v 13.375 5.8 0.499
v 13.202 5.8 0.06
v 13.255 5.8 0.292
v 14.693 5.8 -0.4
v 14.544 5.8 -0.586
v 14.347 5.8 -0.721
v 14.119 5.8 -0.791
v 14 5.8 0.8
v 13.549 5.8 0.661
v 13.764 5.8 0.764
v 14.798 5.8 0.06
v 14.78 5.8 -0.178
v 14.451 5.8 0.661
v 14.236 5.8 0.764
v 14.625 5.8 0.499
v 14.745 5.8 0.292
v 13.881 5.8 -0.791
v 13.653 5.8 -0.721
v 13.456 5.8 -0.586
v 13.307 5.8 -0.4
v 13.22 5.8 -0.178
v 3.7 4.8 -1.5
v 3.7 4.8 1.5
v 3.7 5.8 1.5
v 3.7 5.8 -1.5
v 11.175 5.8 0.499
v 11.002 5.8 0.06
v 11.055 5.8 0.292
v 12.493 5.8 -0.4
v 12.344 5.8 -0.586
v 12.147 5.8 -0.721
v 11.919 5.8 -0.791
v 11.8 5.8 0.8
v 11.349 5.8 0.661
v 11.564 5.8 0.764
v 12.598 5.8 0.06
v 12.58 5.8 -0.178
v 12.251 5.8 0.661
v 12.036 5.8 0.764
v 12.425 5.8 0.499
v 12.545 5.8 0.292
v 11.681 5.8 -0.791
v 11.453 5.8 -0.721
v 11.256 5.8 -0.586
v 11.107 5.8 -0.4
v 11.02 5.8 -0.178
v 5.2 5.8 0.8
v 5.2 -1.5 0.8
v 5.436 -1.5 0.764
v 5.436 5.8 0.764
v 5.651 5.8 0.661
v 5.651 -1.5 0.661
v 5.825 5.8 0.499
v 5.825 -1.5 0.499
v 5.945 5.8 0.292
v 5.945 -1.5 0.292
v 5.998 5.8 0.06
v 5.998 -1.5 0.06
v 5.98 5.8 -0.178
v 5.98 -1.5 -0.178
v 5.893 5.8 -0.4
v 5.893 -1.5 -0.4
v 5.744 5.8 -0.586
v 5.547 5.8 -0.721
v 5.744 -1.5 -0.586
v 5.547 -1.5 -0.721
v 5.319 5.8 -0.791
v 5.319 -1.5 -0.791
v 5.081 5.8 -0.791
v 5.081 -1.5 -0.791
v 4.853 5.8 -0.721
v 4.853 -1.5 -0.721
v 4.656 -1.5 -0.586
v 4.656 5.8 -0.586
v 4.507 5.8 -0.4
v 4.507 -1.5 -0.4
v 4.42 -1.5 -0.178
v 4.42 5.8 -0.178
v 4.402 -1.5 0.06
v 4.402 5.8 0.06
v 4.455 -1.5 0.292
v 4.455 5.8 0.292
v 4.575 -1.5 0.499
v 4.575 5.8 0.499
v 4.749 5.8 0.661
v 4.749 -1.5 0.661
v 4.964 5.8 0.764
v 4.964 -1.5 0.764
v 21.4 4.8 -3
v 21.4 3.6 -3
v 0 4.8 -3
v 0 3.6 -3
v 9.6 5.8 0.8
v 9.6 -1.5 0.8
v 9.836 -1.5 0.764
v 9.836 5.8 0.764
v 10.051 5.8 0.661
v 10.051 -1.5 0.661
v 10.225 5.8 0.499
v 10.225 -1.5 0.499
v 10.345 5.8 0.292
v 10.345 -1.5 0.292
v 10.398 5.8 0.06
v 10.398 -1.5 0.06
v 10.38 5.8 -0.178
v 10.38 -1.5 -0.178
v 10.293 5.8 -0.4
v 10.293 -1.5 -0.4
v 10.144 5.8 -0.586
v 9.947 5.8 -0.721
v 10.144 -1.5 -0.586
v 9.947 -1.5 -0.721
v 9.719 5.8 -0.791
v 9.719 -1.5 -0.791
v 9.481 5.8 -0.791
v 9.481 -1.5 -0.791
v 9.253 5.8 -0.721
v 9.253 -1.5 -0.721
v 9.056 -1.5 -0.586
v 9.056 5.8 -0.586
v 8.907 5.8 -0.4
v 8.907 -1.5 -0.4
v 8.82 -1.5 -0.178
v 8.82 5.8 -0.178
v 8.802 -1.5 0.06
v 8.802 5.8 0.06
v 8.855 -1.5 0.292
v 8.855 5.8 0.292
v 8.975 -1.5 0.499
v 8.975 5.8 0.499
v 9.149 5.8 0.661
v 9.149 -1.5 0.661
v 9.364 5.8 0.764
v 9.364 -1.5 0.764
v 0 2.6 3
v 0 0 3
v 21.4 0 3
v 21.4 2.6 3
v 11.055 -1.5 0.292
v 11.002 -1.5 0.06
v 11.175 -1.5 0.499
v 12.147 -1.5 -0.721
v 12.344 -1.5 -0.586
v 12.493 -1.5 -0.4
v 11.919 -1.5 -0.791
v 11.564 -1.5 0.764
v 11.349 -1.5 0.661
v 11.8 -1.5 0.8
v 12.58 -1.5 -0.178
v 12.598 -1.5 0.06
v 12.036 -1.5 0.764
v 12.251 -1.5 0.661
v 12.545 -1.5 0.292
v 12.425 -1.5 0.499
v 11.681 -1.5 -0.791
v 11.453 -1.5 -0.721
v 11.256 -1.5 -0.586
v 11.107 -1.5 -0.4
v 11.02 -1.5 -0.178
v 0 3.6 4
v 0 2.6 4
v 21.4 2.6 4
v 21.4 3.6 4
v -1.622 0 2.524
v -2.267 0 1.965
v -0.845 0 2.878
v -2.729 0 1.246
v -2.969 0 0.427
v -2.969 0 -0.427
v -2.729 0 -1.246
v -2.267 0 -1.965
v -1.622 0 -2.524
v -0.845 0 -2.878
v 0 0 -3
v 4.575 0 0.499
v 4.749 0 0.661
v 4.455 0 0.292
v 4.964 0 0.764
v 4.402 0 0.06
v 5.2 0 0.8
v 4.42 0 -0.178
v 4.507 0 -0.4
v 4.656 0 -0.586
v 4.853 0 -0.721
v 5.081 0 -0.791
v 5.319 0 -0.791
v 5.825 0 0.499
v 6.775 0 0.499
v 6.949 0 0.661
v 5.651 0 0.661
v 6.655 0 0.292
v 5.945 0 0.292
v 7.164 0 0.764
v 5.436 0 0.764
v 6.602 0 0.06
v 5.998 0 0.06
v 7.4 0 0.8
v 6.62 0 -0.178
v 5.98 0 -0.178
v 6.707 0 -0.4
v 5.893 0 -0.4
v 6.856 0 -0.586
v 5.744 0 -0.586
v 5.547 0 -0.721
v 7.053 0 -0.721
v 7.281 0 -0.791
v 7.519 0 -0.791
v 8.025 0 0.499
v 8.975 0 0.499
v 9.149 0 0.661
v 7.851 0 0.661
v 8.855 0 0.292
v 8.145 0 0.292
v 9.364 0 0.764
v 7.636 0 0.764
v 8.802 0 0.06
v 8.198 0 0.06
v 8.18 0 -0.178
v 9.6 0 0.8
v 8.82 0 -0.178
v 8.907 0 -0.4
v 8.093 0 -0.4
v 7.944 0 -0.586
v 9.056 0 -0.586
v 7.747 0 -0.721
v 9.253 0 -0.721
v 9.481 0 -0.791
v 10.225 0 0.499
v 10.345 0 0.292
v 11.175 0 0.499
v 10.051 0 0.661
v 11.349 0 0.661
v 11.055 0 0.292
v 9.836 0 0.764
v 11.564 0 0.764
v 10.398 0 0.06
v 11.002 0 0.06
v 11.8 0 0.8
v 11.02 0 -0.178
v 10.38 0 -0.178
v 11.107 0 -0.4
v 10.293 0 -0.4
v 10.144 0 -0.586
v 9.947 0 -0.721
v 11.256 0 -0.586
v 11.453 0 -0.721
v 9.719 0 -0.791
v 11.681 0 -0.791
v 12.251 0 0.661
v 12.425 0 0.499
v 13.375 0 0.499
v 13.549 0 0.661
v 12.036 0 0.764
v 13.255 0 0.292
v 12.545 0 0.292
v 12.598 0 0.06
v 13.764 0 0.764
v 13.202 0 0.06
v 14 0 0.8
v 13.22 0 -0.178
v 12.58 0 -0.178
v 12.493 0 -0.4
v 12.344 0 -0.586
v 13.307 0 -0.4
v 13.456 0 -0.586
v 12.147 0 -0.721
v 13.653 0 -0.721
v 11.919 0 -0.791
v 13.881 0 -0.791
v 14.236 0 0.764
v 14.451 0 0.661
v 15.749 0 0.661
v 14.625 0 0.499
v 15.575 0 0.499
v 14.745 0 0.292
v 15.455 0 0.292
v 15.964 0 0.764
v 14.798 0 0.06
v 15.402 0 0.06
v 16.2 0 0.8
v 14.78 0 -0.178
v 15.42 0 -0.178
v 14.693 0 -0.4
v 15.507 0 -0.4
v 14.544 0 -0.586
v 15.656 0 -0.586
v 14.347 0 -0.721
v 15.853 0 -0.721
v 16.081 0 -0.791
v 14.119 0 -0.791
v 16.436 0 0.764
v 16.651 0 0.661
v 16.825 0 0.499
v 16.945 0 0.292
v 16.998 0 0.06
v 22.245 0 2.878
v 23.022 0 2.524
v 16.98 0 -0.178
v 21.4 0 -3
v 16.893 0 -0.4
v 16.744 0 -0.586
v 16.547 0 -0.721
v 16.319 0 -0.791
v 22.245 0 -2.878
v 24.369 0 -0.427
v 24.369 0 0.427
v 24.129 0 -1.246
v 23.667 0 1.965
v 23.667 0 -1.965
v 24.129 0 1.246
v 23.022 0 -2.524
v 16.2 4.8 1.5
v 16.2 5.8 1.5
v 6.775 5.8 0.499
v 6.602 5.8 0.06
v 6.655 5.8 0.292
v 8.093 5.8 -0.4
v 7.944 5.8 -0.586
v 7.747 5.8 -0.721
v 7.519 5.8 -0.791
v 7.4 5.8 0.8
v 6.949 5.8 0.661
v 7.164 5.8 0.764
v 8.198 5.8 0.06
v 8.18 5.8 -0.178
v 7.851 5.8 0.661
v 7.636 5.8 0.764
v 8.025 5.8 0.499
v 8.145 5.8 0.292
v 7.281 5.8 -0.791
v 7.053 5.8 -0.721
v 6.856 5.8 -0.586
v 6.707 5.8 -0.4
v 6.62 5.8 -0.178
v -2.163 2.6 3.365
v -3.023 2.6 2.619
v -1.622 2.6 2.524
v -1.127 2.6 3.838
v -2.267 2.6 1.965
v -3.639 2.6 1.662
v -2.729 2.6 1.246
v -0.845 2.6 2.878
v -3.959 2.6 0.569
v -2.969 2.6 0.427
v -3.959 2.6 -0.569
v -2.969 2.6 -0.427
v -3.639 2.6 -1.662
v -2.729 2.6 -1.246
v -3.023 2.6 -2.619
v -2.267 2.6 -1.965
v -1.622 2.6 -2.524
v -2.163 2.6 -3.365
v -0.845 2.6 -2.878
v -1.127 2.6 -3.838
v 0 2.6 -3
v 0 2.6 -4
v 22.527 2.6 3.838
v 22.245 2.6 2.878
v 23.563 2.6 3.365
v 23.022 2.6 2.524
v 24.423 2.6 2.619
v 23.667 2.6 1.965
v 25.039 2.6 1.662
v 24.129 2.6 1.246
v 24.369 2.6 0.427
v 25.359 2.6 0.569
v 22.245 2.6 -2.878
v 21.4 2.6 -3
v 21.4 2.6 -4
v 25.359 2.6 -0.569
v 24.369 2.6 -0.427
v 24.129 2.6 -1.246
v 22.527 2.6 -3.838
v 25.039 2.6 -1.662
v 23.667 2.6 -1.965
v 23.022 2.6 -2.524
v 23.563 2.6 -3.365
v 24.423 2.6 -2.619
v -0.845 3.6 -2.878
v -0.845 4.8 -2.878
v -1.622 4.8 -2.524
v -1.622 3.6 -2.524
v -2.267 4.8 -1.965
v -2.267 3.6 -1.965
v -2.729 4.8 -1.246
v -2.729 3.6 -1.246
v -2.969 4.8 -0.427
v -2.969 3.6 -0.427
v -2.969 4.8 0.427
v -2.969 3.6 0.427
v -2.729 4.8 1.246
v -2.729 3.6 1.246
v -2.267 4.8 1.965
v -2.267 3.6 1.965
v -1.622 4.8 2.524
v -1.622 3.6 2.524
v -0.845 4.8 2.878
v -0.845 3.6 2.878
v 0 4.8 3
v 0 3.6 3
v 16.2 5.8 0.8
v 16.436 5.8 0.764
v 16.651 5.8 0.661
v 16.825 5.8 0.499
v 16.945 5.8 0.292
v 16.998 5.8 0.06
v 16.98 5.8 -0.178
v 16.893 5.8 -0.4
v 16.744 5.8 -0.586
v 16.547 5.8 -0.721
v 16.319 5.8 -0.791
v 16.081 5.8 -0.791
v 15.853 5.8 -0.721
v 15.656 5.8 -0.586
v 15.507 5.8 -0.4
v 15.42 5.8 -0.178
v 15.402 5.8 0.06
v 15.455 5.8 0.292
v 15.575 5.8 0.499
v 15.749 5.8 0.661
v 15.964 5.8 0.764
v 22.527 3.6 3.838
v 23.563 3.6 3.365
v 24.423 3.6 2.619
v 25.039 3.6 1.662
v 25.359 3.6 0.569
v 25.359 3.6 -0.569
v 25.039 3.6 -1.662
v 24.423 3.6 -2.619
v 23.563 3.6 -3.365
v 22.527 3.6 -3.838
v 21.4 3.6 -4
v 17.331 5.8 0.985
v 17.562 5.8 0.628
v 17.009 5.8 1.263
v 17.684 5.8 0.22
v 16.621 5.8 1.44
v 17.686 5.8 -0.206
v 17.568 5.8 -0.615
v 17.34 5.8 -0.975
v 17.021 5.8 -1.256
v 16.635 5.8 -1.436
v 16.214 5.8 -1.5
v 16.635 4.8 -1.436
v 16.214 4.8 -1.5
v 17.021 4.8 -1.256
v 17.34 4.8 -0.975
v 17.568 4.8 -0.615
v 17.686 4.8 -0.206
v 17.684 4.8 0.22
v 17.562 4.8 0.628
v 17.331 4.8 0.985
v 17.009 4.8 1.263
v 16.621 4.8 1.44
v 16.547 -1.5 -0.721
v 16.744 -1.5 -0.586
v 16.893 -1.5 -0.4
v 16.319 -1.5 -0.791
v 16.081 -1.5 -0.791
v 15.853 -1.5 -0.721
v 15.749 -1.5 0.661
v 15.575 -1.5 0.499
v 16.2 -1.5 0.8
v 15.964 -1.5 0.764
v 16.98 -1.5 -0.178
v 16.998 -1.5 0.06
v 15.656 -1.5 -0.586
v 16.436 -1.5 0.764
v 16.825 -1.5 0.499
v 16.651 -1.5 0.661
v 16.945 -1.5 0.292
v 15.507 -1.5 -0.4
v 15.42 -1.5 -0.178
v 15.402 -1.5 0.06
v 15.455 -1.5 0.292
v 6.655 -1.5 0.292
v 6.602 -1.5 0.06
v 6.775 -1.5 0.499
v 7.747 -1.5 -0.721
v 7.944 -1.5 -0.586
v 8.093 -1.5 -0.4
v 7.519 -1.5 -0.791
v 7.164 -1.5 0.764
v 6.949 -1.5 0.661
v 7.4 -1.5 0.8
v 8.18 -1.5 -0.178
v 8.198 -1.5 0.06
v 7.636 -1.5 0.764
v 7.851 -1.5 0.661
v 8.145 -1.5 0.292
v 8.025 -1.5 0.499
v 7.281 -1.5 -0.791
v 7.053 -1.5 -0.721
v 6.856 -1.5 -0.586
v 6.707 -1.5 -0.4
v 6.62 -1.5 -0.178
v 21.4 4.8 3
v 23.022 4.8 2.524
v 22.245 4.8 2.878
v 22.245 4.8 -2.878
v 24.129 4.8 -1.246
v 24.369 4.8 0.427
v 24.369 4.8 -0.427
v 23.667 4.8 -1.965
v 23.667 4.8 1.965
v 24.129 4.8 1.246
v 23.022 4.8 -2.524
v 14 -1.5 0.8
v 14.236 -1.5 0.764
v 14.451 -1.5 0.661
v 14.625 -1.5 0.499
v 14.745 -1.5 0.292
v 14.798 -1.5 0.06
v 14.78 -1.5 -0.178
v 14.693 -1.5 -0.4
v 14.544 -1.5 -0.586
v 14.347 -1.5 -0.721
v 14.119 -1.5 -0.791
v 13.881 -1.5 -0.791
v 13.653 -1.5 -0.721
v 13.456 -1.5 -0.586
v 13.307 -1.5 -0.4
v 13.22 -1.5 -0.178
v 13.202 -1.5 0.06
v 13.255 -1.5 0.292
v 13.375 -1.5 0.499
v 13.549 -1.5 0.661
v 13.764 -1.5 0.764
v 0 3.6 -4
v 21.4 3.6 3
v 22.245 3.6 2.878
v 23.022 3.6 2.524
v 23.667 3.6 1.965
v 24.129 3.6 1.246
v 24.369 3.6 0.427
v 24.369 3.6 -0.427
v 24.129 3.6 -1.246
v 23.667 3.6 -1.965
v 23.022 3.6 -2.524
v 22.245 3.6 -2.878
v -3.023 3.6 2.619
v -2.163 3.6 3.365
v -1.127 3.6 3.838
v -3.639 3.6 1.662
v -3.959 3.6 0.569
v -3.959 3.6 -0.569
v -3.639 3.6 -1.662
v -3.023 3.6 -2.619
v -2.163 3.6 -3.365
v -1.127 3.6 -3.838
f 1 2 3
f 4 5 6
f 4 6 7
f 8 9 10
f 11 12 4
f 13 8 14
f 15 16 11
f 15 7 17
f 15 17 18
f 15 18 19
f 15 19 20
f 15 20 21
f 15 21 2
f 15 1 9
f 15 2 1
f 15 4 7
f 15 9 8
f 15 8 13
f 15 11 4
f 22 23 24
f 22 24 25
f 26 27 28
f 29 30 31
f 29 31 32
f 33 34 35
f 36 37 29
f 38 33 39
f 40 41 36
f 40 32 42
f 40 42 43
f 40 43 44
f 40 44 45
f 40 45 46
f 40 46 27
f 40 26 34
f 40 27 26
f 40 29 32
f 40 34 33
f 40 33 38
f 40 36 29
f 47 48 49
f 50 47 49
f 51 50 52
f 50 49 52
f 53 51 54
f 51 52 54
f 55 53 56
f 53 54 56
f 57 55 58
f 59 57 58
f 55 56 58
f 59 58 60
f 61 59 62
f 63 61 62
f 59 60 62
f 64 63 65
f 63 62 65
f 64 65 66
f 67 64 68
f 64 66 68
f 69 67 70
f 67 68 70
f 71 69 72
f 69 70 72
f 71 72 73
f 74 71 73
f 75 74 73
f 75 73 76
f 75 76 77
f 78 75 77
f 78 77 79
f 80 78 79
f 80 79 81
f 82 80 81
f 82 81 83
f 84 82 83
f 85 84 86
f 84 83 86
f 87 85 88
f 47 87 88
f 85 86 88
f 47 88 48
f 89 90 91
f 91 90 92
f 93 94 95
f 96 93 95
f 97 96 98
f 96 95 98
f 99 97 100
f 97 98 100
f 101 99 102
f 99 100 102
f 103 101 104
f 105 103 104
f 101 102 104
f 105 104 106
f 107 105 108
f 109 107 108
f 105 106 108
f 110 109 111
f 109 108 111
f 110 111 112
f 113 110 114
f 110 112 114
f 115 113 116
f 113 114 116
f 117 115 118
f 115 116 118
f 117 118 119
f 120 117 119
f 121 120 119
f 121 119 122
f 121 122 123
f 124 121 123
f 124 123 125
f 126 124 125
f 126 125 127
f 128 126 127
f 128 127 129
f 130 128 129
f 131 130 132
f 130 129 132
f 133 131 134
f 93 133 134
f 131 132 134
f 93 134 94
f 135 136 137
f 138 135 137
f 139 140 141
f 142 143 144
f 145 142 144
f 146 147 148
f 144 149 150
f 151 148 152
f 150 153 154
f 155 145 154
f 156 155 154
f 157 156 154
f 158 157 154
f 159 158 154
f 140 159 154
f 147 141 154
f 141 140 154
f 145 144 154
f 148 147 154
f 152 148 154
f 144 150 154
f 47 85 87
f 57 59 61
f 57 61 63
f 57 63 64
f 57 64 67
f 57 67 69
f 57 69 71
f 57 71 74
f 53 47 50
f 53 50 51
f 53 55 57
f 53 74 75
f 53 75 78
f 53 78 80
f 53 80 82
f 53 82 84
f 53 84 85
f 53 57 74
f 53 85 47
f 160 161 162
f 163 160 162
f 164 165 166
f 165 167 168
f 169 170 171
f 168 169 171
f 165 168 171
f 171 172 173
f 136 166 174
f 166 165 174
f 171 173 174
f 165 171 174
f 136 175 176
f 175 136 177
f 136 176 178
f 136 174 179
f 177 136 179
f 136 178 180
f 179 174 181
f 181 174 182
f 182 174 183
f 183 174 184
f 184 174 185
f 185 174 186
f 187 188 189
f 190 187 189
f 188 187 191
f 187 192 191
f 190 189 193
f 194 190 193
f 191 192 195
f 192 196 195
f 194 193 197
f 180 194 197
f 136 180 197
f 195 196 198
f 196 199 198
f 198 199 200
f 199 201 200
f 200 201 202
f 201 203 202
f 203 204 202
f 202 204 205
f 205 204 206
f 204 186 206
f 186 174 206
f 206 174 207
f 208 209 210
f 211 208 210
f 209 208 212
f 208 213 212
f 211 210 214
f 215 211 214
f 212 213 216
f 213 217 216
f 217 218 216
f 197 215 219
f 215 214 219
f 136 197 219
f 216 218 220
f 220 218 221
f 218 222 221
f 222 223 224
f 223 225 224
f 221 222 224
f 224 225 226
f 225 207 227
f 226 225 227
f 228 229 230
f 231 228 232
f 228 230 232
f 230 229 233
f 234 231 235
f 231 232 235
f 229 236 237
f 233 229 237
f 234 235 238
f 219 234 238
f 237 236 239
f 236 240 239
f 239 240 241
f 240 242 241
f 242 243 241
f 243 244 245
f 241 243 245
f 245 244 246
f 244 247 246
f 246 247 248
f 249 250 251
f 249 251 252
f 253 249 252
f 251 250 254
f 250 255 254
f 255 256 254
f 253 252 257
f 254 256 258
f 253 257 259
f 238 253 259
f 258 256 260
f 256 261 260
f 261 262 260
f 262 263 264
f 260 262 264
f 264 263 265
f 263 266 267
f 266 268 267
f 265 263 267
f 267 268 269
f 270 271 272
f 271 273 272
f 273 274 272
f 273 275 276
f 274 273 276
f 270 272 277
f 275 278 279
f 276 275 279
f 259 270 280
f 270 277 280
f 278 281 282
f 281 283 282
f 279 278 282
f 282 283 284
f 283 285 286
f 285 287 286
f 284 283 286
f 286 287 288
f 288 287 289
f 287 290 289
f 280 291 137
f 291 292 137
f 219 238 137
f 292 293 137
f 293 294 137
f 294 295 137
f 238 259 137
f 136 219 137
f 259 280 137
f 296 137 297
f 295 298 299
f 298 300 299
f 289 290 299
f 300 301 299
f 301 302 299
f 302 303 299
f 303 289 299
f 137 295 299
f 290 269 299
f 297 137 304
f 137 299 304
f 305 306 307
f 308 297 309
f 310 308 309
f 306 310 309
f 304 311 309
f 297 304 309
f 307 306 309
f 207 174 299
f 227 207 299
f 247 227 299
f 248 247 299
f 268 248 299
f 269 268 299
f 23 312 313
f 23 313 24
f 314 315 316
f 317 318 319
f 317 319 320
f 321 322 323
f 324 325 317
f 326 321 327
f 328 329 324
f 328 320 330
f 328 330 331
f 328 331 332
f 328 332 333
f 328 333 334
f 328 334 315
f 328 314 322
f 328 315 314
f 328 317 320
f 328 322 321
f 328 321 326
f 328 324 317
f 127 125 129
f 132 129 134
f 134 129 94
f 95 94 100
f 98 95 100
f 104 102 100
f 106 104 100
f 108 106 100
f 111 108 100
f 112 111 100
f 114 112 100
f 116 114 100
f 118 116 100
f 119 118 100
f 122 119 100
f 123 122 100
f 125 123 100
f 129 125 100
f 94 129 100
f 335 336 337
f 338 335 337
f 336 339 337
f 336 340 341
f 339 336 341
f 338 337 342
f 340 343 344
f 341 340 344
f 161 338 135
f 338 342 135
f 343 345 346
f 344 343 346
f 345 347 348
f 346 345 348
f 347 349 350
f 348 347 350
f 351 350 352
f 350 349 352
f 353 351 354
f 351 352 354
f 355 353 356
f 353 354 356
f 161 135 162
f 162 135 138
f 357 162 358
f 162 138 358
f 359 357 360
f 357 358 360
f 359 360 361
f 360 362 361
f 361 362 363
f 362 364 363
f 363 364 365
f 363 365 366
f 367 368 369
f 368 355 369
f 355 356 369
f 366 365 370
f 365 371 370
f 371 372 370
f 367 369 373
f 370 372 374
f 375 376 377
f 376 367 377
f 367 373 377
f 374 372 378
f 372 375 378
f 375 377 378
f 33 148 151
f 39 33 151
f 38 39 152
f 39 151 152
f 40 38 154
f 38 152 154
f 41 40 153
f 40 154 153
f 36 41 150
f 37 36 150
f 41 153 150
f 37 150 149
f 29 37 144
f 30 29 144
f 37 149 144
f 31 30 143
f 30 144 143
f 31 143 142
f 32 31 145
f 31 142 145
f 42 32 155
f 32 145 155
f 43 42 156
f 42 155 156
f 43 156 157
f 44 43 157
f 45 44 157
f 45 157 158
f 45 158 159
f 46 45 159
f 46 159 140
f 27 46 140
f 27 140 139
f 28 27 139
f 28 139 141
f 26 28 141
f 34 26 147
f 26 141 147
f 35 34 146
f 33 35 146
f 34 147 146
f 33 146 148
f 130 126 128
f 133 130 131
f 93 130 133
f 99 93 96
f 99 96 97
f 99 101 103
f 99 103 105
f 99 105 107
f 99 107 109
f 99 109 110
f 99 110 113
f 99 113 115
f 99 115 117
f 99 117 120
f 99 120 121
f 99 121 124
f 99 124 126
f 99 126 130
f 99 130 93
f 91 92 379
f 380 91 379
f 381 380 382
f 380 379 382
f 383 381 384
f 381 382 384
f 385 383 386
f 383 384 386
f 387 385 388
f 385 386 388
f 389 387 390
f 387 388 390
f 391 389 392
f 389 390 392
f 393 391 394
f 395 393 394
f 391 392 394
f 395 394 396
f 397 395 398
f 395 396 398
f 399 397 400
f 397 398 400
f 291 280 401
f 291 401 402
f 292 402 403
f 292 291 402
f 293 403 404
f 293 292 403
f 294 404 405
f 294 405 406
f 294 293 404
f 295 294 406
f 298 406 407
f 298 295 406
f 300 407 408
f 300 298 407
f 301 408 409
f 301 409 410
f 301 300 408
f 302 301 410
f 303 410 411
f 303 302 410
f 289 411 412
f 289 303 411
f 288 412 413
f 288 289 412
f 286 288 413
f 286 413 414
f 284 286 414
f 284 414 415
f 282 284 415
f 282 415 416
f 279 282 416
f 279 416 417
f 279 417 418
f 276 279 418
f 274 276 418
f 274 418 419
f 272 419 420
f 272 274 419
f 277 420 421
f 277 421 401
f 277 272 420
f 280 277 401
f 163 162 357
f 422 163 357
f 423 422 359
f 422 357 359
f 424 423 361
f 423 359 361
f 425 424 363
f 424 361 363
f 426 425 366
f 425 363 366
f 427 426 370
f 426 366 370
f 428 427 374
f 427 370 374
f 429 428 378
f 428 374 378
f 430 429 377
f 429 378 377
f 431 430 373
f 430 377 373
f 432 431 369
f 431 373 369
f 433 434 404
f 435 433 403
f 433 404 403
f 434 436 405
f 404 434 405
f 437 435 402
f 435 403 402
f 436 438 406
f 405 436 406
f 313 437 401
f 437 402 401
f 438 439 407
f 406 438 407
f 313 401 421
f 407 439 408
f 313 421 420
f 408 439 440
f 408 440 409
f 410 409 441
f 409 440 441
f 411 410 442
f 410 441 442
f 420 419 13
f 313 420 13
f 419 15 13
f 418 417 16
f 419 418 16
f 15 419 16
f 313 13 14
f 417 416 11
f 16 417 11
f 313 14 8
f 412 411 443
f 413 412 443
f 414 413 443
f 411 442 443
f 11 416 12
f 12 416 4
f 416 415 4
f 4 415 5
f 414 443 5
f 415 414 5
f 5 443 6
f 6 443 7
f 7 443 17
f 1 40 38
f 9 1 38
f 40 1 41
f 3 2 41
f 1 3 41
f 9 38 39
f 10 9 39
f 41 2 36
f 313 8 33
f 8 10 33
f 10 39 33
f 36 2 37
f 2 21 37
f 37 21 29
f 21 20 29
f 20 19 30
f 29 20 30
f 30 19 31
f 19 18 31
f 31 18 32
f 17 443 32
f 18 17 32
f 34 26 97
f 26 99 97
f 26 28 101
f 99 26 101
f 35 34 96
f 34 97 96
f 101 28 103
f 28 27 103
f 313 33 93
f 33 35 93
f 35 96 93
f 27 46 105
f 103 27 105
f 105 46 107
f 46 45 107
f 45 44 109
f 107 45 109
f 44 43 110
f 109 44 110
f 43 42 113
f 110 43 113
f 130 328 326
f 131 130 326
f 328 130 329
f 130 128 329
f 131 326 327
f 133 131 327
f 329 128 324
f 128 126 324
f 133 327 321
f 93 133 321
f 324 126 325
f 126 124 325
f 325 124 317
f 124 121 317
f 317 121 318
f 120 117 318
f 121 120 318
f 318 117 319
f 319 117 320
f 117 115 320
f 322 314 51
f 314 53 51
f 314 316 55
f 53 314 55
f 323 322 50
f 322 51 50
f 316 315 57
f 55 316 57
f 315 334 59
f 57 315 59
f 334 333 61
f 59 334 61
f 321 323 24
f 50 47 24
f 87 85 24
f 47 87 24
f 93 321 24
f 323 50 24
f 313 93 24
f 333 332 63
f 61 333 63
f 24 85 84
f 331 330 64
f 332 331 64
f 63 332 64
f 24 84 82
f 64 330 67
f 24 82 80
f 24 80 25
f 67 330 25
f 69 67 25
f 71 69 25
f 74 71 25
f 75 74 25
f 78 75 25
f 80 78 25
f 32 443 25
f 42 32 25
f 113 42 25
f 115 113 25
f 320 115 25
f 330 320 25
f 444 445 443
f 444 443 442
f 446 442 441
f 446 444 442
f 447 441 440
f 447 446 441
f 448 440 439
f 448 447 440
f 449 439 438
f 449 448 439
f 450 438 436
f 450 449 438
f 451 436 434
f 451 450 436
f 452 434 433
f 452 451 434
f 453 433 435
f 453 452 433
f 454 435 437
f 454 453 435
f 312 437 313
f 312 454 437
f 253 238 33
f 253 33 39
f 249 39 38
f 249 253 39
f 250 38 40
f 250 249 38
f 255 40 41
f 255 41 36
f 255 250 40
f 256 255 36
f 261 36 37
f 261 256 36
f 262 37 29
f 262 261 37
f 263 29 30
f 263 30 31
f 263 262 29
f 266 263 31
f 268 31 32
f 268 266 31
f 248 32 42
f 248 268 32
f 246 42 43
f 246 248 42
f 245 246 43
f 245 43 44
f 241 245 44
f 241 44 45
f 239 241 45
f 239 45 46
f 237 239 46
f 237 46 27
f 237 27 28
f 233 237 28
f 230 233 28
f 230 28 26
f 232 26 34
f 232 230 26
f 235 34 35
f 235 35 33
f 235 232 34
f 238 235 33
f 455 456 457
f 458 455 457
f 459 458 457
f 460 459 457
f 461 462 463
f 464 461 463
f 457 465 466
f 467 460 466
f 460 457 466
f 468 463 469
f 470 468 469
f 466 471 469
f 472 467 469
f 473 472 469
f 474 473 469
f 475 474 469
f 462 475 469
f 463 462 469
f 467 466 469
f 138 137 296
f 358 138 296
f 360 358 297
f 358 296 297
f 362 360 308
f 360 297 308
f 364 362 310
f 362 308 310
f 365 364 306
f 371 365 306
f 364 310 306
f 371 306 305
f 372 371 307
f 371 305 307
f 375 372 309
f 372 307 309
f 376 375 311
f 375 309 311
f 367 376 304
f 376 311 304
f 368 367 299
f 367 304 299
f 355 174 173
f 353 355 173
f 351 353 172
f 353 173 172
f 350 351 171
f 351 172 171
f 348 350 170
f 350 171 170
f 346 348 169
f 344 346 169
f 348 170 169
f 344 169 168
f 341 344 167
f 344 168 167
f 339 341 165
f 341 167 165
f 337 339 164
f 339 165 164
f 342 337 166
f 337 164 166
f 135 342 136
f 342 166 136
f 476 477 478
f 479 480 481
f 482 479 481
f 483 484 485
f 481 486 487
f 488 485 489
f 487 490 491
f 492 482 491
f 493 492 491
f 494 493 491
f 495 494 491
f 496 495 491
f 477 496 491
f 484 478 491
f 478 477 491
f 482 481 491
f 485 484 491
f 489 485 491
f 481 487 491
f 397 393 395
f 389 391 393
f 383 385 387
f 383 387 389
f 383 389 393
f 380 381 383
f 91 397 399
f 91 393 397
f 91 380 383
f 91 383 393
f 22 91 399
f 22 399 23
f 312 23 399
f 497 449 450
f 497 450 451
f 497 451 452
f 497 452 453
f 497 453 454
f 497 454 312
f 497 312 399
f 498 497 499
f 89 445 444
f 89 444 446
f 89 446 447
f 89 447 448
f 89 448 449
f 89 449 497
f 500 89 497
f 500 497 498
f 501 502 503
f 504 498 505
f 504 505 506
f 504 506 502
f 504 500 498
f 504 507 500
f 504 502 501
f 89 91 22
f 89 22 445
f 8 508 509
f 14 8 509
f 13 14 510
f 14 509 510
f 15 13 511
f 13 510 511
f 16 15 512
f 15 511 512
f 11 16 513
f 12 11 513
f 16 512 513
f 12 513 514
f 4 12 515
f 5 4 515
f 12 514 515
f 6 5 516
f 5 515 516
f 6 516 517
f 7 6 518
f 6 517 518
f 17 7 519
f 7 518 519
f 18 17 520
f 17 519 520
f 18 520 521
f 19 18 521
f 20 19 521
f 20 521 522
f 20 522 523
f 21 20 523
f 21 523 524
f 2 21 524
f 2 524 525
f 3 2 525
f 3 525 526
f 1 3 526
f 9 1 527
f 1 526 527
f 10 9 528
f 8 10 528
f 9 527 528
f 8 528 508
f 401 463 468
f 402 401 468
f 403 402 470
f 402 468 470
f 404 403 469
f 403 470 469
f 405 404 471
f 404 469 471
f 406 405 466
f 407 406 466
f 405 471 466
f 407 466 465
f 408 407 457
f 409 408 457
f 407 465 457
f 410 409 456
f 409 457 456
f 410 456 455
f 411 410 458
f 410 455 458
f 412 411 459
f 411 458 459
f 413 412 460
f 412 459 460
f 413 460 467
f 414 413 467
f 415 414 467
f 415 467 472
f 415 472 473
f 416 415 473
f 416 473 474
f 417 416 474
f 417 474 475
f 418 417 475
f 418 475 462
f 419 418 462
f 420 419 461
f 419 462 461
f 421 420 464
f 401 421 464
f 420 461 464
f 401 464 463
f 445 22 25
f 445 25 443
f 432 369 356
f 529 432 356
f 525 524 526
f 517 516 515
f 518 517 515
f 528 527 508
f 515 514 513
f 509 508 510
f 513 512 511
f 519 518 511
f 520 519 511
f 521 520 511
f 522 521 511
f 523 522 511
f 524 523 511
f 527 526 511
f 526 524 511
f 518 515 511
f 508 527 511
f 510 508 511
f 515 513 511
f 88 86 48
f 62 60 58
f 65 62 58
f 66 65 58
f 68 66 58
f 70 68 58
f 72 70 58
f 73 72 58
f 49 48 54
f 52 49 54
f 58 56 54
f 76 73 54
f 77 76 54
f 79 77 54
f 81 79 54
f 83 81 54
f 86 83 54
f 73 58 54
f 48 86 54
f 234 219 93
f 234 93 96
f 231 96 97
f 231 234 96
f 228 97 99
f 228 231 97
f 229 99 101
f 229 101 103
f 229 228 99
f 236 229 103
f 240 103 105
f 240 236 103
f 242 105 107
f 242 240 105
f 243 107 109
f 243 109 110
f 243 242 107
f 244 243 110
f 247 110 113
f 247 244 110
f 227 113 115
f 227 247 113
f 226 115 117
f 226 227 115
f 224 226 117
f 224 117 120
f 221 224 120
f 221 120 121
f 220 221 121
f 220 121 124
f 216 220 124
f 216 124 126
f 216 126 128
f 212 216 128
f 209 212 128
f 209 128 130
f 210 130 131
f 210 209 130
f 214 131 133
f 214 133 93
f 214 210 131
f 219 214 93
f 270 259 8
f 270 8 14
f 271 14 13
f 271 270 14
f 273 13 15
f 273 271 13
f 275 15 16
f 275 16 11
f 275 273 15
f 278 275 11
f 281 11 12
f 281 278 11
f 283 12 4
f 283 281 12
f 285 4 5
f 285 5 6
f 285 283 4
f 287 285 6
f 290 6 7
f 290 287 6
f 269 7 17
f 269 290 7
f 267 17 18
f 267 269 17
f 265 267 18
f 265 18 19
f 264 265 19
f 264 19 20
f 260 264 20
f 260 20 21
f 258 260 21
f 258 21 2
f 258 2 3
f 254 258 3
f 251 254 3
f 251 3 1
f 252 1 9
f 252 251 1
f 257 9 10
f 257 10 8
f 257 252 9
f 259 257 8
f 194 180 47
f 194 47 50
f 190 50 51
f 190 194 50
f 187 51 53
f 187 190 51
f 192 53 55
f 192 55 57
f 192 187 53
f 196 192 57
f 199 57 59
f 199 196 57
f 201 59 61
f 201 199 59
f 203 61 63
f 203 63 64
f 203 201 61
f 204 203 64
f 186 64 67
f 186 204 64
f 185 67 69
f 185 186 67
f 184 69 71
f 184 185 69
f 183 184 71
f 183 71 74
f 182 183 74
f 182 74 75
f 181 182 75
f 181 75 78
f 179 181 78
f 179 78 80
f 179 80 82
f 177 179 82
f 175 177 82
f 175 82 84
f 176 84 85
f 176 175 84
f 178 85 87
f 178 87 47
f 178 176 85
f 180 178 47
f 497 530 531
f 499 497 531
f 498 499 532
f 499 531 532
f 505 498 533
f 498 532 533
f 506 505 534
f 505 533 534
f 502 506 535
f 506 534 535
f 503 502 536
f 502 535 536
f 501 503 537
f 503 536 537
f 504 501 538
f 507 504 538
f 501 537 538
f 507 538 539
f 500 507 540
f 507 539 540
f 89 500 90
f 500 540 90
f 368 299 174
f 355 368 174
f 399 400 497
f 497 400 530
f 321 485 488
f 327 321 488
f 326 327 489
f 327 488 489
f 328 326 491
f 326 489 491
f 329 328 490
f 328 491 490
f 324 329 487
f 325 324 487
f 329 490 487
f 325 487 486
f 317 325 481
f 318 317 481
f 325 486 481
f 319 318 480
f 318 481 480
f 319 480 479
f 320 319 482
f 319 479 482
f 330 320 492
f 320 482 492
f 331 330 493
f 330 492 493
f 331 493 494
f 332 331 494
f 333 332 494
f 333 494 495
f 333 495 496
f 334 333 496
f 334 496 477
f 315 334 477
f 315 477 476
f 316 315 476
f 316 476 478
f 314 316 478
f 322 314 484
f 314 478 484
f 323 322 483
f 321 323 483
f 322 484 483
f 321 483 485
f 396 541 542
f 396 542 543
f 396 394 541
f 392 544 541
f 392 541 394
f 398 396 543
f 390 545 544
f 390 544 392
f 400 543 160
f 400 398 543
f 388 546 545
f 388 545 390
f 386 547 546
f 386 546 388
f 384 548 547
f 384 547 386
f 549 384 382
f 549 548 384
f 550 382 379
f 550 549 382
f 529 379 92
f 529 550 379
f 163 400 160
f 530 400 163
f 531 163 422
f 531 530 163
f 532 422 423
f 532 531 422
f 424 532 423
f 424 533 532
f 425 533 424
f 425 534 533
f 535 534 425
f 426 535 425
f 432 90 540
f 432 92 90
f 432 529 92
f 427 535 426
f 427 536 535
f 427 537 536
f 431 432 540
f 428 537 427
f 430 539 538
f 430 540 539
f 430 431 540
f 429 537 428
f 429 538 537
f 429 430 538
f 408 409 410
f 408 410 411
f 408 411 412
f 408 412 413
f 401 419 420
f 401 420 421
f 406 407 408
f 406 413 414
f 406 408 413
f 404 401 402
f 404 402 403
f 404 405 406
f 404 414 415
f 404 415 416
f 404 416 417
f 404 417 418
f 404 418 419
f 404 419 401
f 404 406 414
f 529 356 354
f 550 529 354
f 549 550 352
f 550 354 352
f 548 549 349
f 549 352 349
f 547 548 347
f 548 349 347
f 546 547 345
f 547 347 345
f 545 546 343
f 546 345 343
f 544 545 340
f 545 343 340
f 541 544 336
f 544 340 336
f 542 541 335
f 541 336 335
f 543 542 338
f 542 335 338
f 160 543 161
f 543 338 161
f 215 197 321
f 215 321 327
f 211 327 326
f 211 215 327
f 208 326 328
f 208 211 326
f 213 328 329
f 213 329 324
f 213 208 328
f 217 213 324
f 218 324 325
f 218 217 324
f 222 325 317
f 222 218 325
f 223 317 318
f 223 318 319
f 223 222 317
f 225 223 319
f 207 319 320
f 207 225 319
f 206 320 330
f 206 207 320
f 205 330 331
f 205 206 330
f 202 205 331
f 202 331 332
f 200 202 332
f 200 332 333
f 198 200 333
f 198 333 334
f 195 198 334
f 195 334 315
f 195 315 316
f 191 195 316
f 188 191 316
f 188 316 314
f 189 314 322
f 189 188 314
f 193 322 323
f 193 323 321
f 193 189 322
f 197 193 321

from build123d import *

# Parameters (mm, degrees)
BOSS_EXTRUDE1_DEPTH        = 4.8
SKETCH1_3_R                = 0.8
BOSS_EXTRUDE2_DEPTH        = 5.8
BOSS_EXTRUDE3_START        = 2.6
BOSS_EXTRUDE3_DEPTH        = 1
BOSS_EXTRUDE4_DEPTH        = 5.8
BOSS_EXTRUDE4_DEPTH_BACK   = 1.5
SKETCH1_5_R                = 0.8
BOSS_EXTRUDE4_2_DEPTH      = 5.8
BOSS_EXTRUDE4_2_DEPTH_BACK = 1.5
BOSS_EXTRUDE4_3_DEPTH      = 5.8
BOSS_EXTRUDE4_3_DEPTH_BACK = 1.5
BOSS_EXTRUDE4_4_DEPTH      = 5.8
BOSS_EXTRUDE4_4_DEPTH_BACK = 1.5
BOSS_EXTRUDE4_5_DEPTH      = 5.8
BOSS_EXTRUDE4_5_DEPTH_BACK = 1.5
BOSS_EXTRUDE4_6_DEPTH      = 5.8
BOSS_EXTRUDE4_6_DEPTH_BACK = 1.5


with BuildPart() as part:
    # Sketch1 → Boss-Extrude1 (new body)
    with BuildSketch(Plane(origin=(0, 0, 0), x_dir=(1, 0, 0), z_dir=(0, 1, 0))):
        with BuildLine():
            Line((21.4, 3), (0, 3))
            ThreePointArc((0, 3), (-3, 0), (0, -3))
            Line((0, -3), (21.4, -3))
            ThreePointArc((21.4, -3), (24.4, 0), (21.4, 3))
        make_face()
        with BuildLine():
            ThreePointArc((16.213938129, 1.499935241), (17.699983809, -0.006969321), (16.199999637, -1.5))
            Line((16.199999637, -1.5), (3.699983809, -1.499996975))
            Line((3.699983809, -1.499996975), (3.699983809, 1.499935241))
            Line((3.699983809, 1.499935241), (16.213938129, 1.499935241))
        make_face(mode=Mode.SUBTRACT)
    extrude(amount=BOSS_EXTRUDE1_DEPTH)

    # Sketch1<3> → Boss-Extrude2 (add)
    with BuildSketch(Plane(origin=(0, 0, 0), x_dir=(1, 0, 0), z_dir=(0, 1, 0))):
        with BuildLine():
            Line((3.699983809, -1.499996975), (16.199999637, -1.5))
            ThreePointArc((16.199999637, -1.5), (17.699983809, -0.006969321), (16.213938129, 1.499935241))
            Line((16.213938129, 1.499935241), (3.699983809, 1.499935241))
            Line((3.699983809, 1.499935241), (3.699983809, -1.499996975))
        make_face()
        with Locations((5.2, 0)):
            Circle(SKETCH1_3_R, mode=Mode.SUBTRACT)
        with Locations((7.4, 0)):
            Circle(SKETCH1_3_R, mode=Mode.SUBTRACT)
        with Locations((9.6, 0)):
            Circle(SKETCH1_3_R, mode=Mode.SUBTRACT)
        with Locations((11.8, 0)):
            Circle(SKETCH1_3_R, mode=Mode.SUBTRACT)
        with Locations((14, 0)):
            Circle(SKETCH1_3_R, mode=Mode.SUBTRACT)
        with Locations((16.2, 0)):
            Circle(SKETCH1_3_R, mode=Mode.SUBTRACT)
    extrude(amount=BOSS_EXTRUDE2_DEPTH)

    # Sketch1<4> → Boss-Extrude3 (add)
    with BuildSketch(Plane(origin=(0, 0, 0), x_dir=(1, 0, 0), z_dir=(0, 1, 0)).offset(BOSS_EXTRUDE3_START)):
        with BuildLine():
            Line((21.4, 4), (0, 4))
            ThreePointArc((0, 4), (-4, 0), (0, -4))
            Line((0, -4), (21.4, -4))
            ThreePointArc((21.4, -4), (25.4, 0), (21.4, 4))
        make_face()
        with BuildLine():
            ThreePointArc((0, -3), (-3, 0), (0, 3))
            Line((0, 3), (21.4, 3))
            ThreePointArc((21.4, 3), (24.4, 0), (21.4, -3))
            Line((21.4, -3), (0, -3))
        make_face(mode=Mode.SUBTRACT)
    extrude(amount=BOSS_EXTRUDE3_DEPTH)


with BuildPart() as body_2:
    # Sketch1<5> → Boss-Extrude4 (new, two sides: drawn at the far end of the back side and taken through both)
    with BuildSketch(Plane(origin=(0, 0, 0), x_dir=(1, 0, 0), z_dir=(0, 1, 0)).offset(-BOSS_EXTRUDE4_DEPTH_BACK)):
        with Locations((11.8, 0)):
            Circle(SKETCH1_5_R)
    extrude(amount=BOSS_EXTRUDE4_DEPTH + BOSS_EXTRUDE4_DEPTH_BACK)


with BuildPart() as body_3:
    # Sketch1<5> → Boss-Extrude4 2 (new, two sides: drawn at the far end of the back side and taken through both)
    with BuildSketch(Plane(origin=(0, 0, 0), x_dir=(1, 0, 0), z_dir=(0, 1, 0)).offset(-BOSS_EXTRUDE4_2_DEPTH_BACK)):
        with Locations((14, 0)):
            Circle(SKETCH1_5_R)
    extrude(amount=BOSS_EXTRUDE4_2_DEPTH + BOSS_EXTRUDE4_2_DEPTH_BACK)


with BuildPart() as body_4:
    # Sketch1<5> → Boss-Extrude4 3 (new, two sides: drawn at the far end of the back side and taken through both)
    with BuildSketch(Plane(origin=(0, 0, 0), x_dir=(1, 0, 0), z_dir=(0, 1, 0)).offset(-BOSS_EXTRUDE4_3_DEPTH_BACK)):
        with Locations((16.2, 0)):
            Circle(SKETCH1_5_R)
    extrude(amount=BOSS_EXTRUDE4_3_DEPTH + BOSS_EXTRUDE4_3_DEPTH_BACK)


with BuildPart() as body_5:
    # Sketch1<5> → Boss-Extrude4 4 (new, two sides: drawn at the far end of the back side and taken through both)
    with BuildSketch(Plane(origin=(0, 0, 0), x_dir=(1, 0, 0), z_dir=(0, 1, 0)).offset(-BOSS_EXTRUDE4_4_DEPTH_BACK)):
        with Locations((5.2, 0)):
            Circle(SKETCH1_5_R)
    extrude(amount=BOSS_EXTRUDE4_4_DEPTH + BOSS_EXTRUDE4_4_DEPTH_BACK)


with BuildPart() as body_6:
    # Sketch1<5> → Boss-Extrude4 5 (new, two sides: drawn at the far end of the back side and taken through both)
    with BuildSketch(Plane(origin=(0, 0, 0), x_dir=(1, 0, 0), z_dir=(0, 1, 0)).offset(-BOSS_EXTRUDE4_5_DEPTH_BACK)):
        with Locations((7.4, 0)):
            Circle(SKETCH1_5_R)
    extrude(amount=BOSS_EXTRUDE4_5_DEPTH + BOSS_EXTRUDE4_5_DEPTH_BACK)


with BuildPart() as body_7:
    # Sketch1<5> → Boss-Extrude4 6 (new, two sides: drawn at the far end of the back side and taken through both)
    with BuildSketch(Plane(origin=(0, 0, 0), x_dir=(1, 0, 0), z_dir=(0, 1, 0)).offset(-BOSS_EXTRUDE4_6_DEPTH_BACK)):
        with Locations((9.6, 0)):
            Circle(SKETCH1_5_R)
    extrude(amount=BOSS_EXTRUDE4_6_DEPTH + BOSS_EXTRUDE4_6_DEPTH_BACK)


solid = Compound([part.part, body_2.part, body_3.part, body_4.part, body_5.part, body_6.part, body_7.part])
